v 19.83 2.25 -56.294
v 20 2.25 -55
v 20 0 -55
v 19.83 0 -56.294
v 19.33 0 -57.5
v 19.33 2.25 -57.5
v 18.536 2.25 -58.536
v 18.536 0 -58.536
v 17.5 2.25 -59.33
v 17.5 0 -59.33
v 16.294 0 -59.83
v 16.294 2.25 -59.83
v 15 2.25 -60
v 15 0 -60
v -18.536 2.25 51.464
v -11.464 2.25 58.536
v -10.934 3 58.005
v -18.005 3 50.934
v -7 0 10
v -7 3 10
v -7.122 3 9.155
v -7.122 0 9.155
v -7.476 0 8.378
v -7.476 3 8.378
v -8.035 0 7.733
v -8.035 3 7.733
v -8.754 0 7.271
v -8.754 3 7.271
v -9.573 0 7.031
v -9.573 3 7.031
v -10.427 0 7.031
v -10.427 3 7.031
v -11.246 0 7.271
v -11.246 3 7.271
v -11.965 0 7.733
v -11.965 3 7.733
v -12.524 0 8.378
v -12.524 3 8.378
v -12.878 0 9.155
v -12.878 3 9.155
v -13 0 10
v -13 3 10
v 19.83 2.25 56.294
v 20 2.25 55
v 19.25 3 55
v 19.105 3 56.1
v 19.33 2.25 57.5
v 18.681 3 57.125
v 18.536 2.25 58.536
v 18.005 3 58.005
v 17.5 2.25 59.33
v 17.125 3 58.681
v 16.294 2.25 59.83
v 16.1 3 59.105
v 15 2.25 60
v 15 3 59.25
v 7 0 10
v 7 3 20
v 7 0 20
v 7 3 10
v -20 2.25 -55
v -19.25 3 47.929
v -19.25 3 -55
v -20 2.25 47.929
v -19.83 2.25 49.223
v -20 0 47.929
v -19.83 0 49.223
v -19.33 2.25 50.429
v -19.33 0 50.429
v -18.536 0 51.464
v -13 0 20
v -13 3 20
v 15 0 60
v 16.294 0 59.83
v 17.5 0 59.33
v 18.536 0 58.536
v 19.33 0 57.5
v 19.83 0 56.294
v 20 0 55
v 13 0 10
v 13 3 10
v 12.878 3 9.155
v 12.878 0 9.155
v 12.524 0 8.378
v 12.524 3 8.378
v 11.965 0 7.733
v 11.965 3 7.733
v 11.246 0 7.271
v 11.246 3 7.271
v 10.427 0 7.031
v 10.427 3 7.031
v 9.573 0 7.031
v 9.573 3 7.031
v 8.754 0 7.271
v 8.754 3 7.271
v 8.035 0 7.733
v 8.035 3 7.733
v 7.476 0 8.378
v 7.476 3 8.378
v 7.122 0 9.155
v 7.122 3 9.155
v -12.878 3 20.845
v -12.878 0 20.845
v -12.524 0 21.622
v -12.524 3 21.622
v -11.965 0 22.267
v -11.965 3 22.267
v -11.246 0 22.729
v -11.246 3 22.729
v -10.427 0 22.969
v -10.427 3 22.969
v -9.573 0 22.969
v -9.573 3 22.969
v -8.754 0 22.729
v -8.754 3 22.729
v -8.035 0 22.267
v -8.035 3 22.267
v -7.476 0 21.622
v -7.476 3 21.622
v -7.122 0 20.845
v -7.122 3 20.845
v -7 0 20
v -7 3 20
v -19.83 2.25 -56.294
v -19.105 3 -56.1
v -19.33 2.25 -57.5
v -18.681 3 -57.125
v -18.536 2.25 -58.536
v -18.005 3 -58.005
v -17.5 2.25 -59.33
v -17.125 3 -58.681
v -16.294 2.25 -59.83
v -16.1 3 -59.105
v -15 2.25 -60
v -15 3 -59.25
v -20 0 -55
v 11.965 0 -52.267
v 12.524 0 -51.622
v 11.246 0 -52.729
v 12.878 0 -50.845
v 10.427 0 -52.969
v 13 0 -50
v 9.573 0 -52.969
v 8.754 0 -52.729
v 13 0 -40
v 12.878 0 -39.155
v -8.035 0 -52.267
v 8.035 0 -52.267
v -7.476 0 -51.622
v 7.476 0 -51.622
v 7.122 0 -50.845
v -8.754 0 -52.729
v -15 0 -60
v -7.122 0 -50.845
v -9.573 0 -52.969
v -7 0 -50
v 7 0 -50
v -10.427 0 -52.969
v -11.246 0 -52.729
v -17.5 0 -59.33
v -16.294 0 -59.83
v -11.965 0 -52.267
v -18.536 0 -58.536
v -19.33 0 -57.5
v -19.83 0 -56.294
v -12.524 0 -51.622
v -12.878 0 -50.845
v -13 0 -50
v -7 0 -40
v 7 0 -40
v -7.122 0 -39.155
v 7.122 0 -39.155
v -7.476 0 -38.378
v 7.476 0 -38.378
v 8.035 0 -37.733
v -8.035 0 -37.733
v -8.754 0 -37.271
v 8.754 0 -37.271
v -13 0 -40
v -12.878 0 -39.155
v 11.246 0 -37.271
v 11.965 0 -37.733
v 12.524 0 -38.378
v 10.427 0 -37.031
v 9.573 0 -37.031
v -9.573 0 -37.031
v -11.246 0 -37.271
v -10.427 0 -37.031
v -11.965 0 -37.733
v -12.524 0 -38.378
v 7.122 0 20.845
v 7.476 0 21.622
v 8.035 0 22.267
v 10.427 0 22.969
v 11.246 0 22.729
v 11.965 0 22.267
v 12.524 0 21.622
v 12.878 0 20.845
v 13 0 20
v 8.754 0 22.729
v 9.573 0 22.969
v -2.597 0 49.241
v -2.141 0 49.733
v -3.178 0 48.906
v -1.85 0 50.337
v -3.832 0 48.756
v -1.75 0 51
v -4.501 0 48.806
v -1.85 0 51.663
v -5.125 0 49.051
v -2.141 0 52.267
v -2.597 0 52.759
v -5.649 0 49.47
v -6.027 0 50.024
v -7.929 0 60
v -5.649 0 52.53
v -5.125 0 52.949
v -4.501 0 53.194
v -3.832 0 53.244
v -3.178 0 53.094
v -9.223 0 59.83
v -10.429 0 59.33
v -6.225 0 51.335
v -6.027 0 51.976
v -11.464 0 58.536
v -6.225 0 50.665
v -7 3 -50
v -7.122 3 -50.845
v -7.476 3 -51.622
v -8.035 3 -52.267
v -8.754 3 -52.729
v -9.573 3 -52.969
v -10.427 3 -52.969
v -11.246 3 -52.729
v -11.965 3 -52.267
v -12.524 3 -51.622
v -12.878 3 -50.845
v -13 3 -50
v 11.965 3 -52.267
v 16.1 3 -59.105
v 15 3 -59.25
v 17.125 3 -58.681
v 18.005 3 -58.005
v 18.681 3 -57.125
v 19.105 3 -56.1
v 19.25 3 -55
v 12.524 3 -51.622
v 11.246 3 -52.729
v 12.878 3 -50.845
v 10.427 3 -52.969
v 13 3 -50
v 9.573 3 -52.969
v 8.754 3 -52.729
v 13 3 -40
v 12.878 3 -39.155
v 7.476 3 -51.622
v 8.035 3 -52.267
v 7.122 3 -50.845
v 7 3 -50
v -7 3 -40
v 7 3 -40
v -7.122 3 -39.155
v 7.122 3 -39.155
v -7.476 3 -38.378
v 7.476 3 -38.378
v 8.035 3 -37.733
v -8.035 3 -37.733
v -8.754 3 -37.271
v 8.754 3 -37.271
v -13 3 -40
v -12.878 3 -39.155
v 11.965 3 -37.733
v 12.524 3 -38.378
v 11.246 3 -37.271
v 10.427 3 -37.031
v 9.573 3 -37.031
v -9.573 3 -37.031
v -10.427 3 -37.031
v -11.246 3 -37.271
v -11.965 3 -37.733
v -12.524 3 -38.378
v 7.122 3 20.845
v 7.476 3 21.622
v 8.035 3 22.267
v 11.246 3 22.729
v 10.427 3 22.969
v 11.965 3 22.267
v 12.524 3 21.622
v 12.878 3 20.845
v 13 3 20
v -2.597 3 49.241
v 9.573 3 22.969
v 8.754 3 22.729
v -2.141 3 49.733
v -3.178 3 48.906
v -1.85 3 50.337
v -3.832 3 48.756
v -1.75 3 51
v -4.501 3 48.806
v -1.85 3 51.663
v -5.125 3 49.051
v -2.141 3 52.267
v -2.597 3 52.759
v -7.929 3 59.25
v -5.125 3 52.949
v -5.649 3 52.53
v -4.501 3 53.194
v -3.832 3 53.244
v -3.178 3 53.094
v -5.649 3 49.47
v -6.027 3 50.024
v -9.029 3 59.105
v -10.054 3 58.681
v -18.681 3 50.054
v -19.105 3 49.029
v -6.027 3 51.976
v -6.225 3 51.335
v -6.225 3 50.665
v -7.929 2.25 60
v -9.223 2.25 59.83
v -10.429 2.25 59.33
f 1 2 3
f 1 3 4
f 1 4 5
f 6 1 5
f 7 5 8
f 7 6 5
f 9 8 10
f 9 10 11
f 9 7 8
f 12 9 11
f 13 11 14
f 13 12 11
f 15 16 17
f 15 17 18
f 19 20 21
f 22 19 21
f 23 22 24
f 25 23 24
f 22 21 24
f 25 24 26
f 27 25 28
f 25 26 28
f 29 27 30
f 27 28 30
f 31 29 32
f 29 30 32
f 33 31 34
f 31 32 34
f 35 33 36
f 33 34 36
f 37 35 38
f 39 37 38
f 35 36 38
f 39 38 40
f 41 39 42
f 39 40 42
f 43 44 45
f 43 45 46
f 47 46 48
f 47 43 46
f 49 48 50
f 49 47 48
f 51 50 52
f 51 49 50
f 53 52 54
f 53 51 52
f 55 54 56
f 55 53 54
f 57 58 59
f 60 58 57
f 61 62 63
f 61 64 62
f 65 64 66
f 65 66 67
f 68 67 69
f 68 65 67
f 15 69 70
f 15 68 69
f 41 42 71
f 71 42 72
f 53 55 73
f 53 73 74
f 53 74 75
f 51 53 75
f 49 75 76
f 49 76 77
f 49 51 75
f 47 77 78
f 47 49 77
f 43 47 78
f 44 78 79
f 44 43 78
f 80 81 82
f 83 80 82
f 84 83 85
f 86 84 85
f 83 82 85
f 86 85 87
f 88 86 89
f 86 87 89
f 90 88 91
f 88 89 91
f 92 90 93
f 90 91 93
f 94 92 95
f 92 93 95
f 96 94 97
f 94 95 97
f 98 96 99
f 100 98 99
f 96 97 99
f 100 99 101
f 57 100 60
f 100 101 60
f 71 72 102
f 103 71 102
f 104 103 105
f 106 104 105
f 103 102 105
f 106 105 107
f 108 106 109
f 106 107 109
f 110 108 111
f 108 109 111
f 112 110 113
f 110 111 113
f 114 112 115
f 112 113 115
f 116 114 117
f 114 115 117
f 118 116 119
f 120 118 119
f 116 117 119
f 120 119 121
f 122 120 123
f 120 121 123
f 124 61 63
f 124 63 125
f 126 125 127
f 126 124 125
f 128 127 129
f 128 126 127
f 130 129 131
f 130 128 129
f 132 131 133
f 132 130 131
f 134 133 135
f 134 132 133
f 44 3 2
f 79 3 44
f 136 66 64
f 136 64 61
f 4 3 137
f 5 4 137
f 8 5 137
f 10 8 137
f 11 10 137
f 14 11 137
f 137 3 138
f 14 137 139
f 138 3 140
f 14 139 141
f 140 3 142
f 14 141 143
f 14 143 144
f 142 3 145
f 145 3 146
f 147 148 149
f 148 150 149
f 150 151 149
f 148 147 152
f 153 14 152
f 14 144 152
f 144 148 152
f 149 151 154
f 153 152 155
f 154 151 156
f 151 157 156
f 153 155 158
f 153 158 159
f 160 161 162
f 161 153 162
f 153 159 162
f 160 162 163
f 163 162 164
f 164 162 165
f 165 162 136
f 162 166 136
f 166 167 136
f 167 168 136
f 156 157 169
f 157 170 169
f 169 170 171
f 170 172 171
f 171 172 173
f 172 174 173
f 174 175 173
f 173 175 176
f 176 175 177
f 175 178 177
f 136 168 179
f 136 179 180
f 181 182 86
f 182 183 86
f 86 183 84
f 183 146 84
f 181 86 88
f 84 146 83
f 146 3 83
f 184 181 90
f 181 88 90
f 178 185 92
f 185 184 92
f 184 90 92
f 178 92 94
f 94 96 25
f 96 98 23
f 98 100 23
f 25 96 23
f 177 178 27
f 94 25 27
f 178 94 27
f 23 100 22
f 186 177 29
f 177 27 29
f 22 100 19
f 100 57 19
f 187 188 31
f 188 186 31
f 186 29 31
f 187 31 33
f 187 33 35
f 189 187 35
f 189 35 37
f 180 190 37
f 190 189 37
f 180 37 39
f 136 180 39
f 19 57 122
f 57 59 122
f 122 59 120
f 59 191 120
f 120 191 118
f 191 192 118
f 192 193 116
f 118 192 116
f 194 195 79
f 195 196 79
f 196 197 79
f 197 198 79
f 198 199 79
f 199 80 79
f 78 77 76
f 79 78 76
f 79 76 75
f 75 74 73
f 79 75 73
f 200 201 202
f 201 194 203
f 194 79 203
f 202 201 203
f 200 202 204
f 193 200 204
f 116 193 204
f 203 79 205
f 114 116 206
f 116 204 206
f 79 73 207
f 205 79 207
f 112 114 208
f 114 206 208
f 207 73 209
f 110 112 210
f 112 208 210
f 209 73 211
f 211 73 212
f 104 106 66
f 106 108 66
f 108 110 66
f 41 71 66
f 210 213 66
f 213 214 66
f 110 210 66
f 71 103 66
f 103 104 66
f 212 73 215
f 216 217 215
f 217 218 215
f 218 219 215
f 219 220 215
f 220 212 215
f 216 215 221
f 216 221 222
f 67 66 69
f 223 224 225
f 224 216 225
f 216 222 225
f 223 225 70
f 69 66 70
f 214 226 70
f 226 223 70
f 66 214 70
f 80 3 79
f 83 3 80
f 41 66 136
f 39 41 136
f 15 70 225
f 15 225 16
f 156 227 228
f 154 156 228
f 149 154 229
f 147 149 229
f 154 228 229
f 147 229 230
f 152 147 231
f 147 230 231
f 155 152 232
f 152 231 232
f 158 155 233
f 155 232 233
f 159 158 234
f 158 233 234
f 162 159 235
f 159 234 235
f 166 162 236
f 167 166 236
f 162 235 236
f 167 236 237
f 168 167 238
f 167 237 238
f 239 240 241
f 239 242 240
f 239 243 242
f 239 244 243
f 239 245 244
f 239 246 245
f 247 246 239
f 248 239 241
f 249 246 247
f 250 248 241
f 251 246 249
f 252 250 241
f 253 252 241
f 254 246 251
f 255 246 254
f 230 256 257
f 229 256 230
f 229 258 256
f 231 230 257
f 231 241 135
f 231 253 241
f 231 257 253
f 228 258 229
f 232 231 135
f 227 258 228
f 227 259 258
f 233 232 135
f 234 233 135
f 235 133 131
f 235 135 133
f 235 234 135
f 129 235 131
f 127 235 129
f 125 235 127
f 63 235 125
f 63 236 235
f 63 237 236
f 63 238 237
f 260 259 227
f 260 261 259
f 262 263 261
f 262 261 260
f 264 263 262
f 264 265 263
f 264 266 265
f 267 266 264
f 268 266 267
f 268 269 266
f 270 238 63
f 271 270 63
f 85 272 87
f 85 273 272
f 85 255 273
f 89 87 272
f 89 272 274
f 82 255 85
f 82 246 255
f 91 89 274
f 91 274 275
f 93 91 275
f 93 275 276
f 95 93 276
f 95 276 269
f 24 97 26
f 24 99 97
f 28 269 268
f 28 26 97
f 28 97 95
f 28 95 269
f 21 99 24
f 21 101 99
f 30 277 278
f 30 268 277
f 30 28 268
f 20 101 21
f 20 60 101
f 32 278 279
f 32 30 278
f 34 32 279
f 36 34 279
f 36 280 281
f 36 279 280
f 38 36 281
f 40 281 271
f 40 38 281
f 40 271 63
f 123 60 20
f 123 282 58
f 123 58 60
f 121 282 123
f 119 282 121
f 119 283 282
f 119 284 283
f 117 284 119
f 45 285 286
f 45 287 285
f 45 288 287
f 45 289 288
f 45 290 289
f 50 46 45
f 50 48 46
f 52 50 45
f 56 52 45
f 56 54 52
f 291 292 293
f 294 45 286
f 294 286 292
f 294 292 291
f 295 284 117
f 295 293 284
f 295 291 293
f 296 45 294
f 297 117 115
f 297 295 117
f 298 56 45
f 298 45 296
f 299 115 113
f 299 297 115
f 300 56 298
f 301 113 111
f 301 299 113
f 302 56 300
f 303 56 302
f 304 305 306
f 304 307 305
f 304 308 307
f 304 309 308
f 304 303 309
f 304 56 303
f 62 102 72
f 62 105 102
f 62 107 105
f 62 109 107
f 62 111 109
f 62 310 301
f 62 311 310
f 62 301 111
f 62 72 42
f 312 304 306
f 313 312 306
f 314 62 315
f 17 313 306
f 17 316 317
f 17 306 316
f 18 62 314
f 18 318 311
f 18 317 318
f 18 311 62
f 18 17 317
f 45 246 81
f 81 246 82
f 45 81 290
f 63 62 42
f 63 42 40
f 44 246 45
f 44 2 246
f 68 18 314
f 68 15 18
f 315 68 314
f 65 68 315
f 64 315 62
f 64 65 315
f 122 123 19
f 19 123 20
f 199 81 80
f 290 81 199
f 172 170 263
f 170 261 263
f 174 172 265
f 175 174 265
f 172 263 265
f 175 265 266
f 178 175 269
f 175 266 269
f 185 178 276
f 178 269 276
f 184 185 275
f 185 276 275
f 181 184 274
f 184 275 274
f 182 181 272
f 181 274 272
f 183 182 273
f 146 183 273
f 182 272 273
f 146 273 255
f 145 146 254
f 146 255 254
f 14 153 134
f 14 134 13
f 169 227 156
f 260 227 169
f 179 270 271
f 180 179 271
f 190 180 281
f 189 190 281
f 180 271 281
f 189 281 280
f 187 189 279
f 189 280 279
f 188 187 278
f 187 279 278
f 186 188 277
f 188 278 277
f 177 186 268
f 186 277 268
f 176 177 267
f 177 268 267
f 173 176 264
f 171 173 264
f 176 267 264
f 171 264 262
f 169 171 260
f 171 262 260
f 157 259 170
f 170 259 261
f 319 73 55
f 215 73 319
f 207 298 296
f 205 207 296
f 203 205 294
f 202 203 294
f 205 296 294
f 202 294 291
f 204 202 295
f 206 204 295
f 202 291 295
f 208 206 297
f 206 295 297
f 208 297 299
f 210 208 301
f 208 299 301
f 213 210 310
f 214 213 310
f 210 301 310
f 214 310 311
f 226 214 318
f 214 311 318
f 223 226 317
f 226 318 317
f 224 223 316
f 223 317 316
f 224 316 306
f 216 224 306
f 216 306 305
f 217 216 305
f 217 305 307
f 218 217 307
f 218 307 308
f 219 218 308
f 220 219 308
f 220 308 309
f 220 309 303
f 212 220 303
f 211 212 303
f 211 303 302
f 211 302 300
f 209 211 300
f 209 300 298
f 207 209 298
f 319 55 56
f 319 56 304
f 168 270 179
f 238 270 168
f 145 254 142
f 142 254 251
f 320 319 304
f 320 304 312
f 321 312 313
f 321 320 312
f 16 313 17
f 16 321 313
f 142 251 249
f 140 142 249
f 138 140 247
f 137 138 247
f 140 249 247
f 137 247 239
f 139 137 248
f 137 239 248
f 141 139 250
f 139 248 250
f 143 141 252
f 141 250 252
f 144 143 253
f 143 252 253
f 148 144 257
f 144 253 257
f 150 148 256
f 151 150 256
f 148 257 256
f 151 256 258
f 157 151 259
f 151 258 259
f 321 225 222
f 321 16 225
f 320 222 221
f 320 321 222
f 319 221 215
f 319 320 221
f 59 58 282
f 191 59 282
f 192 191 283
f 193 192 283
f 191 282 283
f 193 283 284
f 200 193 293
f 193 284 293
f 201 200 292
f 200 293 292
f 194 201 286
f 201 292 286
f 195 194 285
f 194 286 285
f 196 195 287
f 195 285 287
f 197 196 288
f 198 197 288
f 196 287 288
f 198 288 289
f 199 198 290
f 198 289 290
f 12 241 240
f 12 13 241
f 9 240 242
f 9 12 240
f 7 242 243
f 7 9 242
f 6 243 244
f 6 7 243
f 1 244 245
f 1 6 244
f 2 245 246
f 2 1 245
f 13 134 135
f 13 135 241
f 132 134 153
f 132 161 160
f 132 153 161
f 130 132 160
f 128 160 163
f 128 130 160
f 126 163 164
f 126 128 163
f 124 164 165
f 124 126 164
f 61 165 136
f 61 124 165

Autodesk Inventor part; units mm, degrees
ref_plane "YZ Plane" through (0, 0, 0) normal (1, 0, 0) x (0, 1, 0)
ref_plane "XZ Plane" through (0, 0, 0) normal (0, 1, 0) x (-1, 0, 0)
ref_plane "XY Plane" through (0, 0, 0) normal (0, 0, 1) x (1, 0, 0)
sketch "Sketch1" plane through (0, 0, 0) normal (0, 1, 0) x (-1, 0, 0)
  line L0 (-20, 60) -> (20, 60)
  line L1 (20, 60) -> (20, -60)
  line L2 (20, -60) -> (-20, -60)
  line L3 (-20, -60) -> (-20, 60)
  line L4 (-20, 60) -> (20, -60) construction
  line L5 (20, 60) -> (-20, -60) construction
  point P0 (0, 0)
  dimension "d0" = 120
  dimension "d1" = 40
extrude "Extrusion1" add sketch "Sketch1" along normal blind 3
sketch "Sketch2" plane through (0, 3, 0) normal (0, 1, 0) x (1, 0, 0)
  line L0 (-10, -20) -> (-10, -10) construction
  line L1 (-7, -20) -> (-7, -10)
  line L2 (-13, -10) -> (-13, -20)
  arc A0 (-13, -20) -> (-7, -20) centre (-10, -20) ccw
  arc A1 (-7, -10) -> (-13, -10) centre (-10, -10) ccw
  line L3 (-32, 15) -> (32, 15) construction
  line L4 (20, 60) -> (-20, 60) projected
  line L5 (0, 84) -> (0, -84) projected
  line L6 (-10, 50) -> (-10, 40) construction
  line L7 (-7, 50) -> (-7, 40)
  line L8 (-13, 40) -> (-13, 50)
  arc A2 (-7, 50) -> (-13, 50) centre (-10, 50) ccw
  arc A3 (-13, 40) -> (-7, 40) centre (-10, 40) ccw
  line L9 (10, -20) -> (10, -10) construction
  line L10 (7, -20) -> (7, -10)
  line L11 (13, -10) -> (13, -20)
  arc A4 (7, -20) -> (13, -20) centre (10, -20) ccw
  arc A5 (13, -10) -> (7, -10) centre (10, -10) ccw
  line L12 (10, 50) -> (10, 40) construction
  line L13 (7, 50) -> (7, 40)
  line L14 (13, 40) -> (13, 50)
  arc A6 (13, 50) -> (7, 50) centre (10, 50) ccw
  arc A7 (7, 40) -> (13, 40) centre (10, 40) ccw
  point P0 (0, 0)
  point P1 (-10, -15)
  point P2 (-10, 45)
  point P3 (10, -15)
  point P4 (10, 45)
  dimension "d4" = 3
  dimension "d5" = 10
  dimension "d6" = 30
  dimension "d7" = 45
  dimension "d8" = 10
sketch "Sketch3" plane through (0, 3, 0) normal (0, 1, 0) x (1, 0, 0)
  circle A0 centre (-4, -51) radius 2.25
  line L0 (-20, -60) -> (20, -60) projected
  line L1 (20, -60) -> (20, 60) projected
  line L2 (-20, 60) -> (-20, -60) projected
  point P0 (0, 0)
  dimension "d9" = 4.5
  dimension "d10" = 9
  dimension "d16" = 16
extrude "Extrusion2" cut sketch "Sketch3" against normal blind 3
extrude "Extrusion3" cut sketch "Sketch2" against normal blind 3
chamfer "Chamfer1" distance 10 angle 45 1 edges at (-20, 1.5, 60)
fillet "Fillet1" radius 5 5 edges at (-10, 1.5, 60) (-20, 1.5, 50) (20, 1.5, 60) (20, 1.5, -60) (-20, 1.5, -60)
chamfer "Chamfer2" distance 0.75 angle 45 10 edges at (20, 3, 0) (18.5355, 3, -58.5355) (0, 3, -60) (-18.5355, 3, -58.5355) (-20, 3, -3.5355) (-19.6194, 3, 49.8423) (-15, 3, 55) (-9.8423, 3, 59.6194) (3.5355, 3, 60) (18.5355, 3, 58.5355)
properties part number "Rear"
